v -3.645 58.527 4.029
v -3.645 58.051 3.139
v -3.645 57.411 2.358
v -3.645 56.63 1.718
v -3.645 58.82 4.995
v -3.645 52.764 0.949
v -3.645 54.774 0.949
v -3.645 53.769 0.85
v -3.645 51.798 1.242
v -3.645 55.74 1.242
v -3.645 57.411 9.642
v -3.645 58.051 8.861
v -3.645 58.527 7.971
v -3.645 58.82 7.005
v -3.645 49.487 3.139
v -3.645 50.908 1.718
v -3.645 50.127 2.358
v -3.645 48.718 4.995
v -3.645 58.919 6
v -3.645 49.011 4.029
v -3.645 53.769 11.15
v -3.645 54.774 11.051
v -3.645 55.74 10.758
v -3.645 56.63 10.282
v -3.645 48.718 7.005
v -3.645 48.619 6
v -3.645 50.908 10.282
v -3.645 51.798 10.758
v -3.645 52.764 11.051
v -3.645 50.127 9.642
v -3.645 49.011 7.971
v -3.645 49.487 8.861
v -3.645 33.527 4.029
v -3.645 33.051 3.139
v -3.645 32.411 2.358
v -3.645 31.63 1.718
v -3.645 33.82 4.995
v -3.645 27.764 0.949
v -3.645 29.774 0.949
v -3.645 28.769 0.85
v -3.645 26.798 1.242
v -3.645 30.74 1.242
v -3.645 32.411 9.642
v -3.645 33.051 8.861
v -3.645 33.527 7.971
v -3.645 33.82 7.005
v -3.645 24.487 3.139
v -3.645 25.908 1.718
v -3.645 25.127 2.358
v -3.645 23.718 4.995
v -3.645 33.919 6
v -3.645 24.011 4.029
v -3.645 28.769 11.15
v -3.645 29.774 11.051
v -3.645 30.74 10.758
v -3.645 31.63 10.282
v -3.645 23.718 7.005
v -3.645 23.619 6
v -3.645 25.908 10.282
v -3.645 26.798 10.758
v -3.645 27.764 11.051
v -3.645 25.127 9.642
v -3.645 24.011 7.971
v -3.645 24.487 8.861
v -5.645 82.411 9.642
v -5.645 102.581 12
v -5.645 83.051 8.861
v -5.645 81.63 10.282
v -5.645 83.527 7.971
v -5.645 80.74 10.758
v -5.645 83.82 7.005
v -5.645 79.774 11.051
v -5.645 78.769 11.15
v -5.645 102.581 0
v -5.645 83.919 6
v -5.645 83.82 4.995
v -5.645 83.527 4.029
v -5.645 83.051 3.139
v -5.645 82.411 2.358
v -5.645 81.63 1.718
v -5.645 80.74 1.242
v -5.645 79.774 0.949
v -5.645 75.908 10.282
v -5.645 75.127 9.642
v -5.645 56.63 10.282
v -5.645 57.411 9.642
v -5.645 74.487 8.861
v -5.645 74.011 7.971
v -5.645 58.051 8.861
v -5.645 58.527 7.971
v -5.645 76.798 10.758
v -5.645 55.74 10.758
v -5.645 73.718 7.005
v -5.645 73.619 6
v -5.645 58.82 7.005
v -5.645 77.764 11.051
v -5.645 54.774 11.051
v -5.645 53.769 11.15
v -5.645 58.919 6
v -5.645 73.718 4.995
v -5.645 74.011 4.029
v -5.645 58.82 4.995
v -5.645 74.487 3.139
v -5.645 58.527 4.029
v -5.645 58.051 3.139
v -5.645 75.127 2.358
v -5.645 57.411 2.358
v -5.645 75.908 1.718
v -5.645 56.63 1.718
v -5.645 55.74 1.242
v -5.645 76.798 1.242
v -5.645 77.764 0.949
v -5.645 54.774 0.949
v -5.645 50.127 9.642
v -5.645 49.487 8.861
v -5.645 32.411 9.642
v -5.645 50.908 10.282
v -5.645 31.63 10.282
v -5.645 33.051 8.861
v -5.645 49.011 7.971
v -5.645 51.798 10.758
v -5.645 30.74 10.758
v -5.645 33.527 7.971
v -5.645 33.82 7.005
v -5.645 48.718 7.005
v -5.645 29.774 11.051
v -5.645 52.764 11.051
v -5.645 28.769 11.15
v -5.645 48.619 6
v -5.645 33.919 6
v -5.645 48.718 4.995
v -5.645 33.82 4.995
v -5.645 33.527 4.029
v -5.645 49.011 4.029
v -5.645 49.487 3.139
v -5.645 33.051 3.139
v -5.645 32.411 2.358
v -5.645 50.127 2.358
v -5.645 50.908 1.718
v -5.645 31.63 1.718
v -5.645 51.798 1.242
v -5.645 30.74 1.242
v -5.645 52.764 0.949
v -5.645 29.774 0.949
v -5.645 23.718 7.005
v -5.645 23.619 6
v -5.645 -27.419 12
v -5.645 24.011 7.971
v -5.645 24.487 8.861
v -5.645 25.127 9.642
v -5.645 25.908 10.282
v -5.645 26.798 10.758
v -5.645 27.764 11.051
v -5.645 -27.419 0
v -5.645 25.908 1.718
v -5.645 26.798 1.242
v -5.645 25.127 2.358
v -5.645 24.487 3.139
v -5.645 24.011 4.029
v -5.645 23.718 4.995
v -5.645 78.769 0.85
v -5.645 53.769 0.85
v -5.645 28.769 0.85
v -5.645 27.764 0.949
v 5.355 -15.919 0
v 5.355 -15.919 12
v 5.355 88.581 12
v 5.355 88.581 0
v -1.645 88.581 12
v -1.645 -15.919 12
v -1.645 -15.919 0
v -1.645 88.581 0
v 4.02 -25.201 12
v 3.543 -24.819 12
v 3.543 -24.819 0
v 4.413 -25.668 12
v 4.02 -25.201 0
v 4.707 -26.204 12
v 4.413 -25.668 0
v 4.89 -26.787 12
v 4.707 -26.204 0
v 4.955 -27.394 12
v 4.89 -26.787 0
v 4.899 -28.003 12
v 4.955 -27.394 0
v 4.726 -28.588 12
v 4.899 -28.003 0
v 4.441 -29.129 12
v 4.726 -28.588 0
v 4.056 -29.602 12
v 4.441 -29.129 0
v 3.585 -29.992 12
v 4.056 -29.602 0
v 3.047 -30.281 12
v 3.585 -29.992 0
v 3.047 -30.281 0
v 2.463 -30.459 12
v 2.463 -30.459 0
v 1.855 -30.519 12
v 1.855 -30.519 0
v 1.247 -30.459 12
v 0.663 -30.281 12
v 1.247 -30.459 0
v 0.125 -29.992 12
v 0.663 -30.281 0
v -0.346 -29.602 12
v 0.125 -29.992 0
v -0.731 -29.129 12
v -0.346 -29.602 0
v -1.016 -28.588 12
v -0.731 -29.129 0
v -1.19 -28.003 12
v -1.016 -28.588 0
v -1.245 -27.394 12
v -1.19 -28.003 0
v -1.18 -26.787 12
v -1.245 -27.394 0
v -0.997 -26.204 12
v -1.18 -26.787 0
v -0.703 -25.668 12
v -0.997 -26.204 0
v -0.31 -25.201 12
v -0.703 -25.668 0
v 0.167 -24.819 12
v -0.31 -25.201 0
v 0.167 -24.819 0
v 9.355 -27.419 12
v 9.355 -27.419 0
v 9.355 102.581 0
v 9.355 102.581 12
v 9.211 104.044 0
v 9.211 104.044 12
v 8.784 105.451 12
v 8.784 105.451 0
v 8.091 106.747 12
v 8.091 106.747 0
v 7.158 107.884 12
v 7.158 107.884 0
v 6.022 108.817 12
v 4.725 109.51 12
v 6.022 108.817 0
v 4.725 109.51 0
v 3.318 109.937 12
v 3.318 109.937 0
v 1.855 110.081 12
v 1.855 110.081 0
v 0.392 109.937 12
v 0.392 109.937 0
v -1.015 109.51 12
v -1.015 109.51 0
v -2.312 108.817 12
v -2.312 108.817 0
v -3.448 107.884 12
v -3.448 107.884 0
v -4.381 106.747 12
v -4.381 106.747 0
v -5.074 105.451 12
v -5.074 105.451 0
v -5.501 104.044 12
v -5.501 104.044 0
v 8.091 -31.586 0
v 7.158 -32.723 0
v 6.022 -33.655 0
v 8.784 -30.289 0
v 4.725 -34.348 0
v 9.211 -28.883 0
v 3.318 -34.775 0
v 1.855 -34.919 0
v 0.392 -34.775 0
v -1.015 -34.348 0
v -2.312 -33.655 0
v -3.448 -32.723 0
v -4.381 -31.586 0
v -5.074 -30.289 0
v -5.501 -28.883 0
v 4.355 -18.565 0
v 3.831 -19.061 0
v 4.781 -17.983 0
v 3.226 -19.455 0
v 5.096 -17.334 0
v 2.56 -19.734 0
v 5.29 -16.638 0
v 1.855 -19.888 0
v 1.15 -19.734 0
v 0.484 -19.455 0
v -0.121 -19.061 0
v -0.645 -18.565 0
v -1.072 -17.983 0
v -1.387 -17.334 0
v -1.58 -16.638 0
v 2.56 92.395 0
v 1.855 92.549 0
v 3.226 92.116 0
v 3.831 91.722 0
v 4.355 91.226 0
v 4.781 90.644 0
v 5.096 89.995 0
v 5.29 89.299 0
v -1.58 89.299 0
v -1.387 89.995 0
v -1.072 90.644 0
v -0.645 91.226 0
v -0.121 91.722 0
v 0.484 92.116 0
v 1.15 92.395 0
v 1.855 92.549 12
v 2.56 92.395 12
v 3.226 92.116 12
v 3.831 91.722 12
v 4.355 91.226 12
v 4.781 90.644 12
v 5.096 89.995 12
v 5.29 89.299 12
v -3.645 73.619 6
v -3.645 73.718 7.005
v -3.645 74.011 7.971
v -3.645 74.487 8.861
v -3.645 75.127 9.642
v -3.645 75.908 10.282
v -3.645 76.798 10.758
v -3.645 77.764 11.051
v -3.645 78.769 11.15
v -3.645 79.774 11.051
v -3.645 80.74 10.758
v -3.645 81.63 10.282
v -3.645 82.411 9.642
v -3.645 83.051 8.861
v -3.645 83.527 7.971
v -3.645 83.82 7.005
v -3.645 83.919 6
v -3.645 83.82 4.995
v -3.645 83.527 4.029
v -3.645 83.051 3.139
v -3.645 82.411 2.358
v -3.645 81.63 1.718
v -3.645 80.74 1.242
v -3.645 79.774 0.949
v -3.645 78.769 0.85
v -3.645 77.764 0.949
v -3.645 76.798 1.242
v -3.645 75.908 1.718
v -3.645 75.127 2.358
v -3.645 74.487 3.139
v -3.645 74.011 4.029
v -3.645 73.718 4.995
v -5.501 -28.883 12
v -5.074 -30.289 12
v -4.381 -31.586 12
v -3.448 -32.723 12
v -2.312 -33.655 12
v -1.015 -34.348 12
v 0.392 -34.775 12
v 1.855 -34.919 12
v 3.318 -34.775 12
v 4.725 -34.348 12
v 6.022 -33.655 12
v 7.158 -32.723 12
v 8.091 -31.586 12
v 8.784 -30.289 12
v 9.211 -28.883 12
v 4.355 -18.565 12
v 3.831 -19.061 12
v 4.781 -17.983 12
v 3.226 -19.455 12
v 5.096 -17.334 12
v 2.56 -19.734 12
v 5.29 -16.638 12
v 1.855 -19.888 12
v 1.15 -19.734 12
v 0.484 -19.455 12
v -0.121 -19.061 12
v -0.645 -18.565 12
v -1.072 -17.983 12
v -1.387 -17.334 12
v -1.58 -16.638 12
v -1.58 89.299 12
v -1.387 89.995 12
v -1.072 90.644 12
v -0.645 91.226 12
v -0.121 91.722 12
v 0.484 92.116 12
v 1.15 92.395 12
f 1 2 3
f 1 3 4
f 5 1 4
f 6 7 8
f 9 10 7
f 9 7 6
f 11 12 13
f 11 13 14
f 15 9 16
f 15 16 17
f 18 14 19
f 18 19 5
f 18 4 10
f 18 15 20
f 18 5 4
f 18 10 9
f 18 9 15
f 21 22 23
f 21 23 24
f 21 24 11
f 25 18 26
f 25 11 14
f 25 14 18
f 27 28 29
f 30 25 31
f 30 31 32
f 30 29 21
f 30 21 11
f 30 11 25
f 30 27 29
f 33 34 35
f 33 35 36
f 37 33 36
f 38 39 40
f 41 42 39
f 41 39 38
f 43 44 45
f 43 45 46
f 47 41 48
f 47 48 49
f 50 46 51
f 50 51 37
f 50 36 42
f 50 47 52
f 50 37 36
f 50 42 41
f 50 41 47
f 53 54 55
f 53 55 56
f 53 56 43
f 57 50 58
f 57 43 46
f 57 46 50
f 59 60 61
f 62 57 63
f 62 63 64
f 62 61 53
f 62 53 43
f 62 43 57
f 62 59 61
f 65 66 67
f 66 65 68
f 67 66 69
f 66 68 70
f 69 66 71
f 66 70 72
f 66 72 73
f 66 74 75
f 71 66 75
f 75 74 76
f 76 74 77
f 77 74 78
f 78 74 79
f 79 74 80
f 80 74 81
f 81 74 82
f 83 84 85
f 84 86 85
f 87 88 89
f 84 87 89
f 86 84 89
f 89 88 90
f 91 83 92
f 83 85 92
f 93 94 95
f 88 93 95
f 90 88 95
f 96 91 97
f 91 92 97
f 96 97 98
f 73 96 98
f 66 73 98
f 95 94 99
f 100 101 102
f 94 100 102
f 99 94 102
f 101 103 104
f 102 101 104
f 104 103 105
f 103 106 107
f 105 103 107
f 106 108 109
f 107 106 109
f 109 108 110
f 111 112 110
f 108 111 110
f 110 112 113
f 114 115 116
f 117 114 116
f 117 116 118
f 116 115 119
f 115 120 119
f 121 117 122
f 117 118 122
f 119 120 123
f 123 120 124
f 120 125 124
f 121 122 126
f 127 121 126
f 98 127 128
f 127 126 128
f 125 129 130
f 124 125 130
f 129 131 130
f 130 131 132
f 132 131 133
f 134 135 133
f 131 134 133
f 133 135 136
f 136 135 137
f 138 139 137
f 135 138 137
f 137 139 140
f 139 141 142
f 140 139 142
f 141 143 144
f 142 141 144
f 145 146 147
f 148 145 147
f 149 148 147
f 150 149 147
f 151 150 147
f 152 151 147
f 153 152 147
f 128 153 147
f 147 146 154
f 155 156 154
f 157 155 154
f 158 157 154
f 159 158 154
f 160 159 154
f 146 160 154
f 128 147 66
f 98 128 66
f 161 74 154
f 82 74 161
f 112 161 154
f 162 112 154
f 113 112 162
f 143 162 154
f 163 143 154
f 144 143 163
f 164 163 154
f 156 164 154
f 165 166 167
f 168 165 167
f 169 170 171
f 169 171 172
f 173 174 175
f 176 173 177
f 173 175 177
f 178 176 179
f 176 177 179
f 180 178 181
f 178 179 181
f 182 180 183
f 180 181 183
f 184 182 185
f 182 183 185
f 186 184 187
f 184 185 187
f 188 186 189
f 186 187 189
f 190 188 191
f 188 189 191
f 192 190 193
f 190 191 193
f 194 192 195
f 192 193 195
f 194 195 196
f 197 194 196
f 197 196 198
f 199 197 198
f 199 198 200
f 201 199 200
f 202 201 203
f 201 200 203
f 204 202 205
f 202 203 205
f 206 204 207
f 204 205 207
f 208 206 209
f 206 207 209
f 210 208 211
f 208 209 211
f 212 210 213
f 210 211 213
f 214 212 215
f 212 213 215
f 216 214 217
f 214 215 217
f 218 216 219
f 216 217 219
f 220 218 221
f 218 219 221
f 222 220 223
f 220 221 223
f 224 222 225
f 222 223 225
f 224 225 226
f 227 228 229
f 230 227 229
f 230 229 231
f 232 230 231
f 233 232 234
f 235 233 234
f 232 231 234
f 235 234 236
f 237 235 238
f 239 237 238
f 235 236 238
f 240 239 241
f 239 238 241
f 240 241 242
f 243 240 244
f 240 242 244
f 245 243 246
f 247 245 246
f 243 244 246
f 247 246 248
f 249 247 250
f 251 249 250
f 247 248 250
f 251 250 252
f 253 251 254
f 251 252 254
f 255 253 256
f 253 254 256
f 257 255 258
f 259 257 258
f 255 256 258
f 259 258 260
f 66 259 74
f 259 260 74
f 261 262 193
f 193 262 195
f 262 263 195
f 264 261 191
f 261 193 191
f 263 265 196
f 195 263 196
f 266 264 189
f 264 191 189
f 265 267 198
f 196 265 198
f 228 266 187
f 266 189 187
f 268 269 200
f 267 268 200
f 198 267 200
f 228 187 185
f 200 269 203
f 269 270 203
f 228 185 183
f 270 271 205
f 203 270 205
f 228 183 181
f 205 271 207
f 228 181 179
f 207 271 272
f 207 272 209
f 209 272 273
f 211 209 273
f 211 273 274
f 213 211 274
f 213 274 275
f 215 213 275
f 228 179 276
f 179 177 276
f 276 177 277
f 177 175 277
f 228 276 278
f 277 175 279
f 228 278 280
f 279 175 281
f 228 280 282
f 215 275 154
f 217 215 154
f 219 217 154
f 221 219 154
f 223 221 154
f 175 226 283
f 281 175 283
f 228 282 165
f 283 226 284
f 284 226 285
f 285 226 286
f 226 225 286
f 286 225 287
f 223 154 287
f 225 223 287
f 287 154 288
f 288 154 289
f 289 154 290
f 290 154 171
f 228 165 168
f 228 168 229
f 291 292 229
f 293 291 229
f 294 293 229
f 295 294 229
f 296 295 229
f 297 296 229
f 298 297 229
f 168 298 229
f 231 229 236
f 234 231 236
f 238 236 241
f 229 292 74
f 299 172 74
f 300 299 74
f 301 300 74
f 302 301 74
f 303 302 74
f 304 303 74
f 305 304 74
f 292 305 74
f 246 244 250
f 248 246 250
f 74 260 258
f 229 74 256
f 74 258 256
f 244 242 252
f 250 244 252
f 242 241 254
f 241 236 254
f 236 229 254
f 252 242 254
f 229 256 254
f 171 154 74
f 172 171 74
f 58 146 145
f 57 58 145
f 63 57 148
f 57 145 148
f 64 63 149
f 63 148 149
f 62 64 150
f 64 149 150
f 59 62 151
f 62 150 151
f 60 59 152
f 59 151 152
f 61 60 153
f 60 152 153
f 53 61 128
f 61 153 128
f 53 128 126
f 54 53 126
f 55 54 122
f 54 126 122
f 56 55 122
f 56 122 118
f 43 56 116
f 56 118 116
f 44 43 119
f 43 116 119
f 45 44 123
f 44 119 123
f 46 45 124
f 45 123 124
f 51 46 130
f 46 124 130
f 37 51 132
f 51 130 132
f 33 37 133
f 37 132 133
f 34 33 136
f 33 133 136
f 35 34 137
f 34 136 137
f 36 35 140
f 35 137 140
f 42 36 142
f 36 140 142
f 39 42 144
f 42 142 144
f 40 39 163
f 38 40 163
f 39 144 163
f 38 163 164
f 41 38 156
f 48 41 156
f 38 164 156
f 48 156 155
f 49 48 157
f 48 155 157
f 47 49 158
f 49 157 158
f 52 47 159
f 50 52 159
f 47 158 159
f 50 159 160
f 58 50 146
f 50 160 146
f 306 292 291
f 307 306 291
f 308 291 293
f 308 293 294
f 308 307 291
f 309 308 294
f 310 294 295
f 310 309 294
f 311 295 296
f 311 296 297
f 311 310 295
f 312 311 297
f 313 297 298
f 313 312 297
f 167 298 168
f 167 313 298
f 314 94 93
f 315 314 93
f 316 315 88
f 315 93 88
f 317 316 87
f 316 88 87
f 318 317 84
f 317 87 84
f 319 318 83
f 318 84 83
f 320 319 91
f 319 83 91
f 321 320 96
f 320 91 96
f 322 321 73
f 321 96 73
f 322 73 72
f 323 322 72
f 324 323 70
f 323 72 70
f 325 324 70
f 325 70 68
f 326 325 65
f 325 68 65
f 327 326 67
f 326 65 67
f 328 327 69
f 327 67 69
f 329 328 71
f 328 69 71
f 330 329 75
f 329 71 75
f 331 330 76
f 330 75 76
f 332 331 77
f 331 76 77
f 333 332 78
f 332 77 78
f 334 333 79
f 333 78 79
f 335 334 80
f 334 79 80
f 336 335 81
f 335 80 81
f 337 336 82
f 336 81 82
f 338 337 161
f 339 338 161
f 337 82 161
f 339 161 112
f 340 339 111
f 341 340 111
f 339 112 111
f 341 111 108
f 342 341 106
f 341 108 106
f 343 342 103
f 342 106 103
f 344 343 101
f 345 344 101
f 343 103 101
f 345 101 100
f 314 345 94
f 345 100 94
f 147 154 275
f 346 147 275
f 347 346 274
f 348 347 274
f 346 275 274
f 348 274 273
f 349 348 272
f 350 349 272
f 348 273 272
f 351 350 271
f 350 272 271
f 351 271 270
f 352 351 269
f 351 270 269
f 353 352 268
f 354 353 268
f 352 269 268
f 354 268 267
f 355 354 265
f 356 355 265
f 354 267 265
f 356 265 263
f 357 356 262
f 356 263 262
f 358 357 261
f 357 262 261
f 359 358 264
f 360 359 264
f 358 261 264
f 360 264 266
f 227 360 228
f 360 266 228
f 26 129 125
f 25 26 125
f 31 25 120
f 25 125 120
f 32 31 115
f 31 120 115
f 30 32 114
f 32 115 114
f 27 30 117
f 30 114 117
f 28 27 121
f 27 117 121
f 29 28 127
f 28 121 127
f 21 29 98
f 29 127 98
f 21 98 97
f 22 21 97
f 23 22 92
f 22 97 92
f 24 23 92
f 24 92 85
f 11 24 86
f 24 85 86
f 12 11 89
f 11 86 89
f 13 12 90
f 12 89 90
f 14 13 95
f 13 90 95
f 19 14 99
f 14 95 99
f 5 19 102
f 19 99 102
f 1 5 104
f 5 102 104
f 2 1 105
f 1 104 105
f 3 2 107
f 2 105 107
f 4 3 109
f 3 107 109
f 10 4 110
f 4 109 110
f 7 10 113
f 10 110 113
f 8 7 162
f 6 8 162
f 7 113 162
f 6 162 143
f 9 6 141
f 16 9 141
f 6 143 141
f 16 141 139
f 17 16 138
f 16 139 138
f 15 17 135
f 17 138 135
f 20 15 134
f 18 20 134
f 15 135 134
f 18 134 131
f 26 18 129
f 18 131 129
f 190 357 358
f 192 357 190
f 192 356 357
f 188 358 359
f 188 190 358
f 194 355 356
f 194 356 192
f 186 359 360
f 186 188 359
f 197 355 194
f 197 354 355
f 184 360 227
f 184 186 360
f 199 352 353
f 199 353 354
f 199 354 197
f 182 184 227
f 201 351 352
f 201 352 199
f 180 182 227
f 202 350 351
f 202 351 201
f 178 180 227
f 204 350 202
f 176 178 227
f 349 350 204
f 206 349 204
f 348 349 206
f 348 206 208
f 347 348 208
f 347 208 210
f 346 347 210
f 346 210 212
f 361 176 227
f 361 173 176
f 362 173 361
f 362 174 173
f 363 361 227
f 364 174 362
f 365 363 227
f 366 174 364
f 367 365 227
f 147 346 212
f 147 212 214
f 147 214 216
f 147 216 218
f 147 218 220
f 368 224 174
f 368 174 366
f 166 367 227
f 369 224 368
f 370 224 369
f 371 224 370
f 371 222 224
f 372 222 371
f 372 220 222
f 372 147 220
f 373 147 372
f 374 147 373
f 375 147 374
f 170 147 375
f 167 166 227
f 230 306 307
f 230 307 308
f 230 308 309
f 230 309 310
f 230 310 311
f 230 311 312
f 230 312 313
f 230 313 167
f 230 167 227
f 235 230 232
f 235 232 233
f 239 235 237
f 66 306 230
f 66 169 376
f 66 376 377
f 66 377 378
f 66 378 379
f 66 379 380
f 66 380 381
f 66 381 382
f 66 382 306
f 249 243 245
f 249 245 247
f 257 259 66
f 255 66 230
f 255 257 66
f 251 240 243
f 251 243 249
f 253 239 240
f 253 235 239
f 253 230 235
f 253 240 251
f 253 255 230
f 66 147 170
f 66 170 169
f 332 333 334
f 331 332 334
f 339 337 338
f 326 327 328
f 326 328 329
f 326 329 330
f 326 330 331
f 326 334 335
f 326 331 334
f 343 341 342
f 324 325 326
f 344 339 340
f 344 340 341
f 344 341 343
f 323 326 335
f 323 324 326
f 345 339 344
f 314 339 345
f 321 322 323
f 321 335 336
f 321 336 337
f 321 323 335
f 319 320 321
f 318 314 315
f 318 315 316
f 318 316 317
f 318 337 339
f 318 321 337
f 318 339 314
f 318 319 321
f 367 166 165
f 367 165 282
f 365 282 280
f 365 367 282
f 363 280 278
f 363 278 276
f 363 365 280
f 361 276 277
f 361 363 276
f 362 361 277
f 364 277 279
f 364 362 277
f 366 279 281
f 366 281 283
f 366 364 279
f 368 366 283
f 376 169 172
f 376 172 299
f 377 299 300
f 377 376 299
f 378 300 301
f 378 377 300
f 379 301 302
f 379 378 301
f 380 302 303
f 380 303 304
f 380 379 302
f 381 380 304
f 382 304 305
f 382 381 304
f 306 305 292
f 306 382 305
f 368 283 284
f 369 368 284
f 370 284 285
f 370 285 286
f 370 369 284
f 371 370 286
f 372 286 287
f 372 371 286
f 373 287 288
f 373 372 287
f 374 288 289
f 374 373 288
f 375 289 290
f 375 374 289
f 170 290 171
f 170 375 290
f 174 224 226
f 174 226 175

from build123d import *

# Parameters (mm, degrees)
BOSS_EXTRUDE1_DEPTH = 12
SKETCH2_R           = 3.1
BOSS_EXTRUDE2_DEPTH = 15
CUT_EXTRUDE1_START  = -50
CUT_EXTRUDE1_DEPTH  = 50
CUT_EXTRUDE2_START  = -15
CUT_EXTRUDE2_DEPTH  = 15
SKETCH5_W           = 7
SKETCH5_H           = 112.5
CUT_EXTRUDE3_DEPTH  = 12
SKETCH6_R           = 5.15
CUT_EXTRUDE4_DEPTH  = 2
FILLET1_R           = 4


with BuildPart() as part:
    # Sketch1 → Boss-Extrude1 (new body)
    with BuildSketch(Plane.XY):
        with BuildLine():
            Line((-5.64516129, 102.580645161), (-5.64516129, -27.419354839))
            ThreePointArc((-5.64516129, -27.419354839), (1.85483871, -34.919354839), (9.35483871, -27.419354839))
            Line((9.35483871, -27.419354839), (9.35483871, 102.580645161))
            ThreePointArc((9.35483871, 102.580645161), (1.85483871, 110.080645161), (-5.64516129, 102.580645161))
        make_face()
    extrude(amount=BOSS_EXTRUDE1_DEPTH)

    # Sketch2 → Boss-Extrude2 (add)
    with BuildSketch(Plane.XY.offset(12)):
        with Locations(Location((1.85483871, -27.419354839, 0), (0, 0, 180))):
            Circle(SKETCH2_R)
    extrude(amount=BOSS_EXTRUDE2_DEPTH)

    # Sketch3 → Cut-Extrude1 (cut)
    with BuildSketch(Plane.XY.offset(27).offset(CUT_EXTRUDE1_START)):
        with BuildLine():
            Line((0.166644408, -24.819354839), (3.543033011, -24.819354839))
            ThreePointArc((3.543033011, -24.819354839), (1.85483871, -30.519354839), (0.166644408, -24.819354839))
        make_face()
    extrude(amount=CUT_EXTRUDE1_DEPTH, mode=Mode.SUBTRACT)

    # Sketch4 → Cut-Extrude2 (cut)
    with BuildSketch(Plane.XY.offset(27).offset(CUT_EXTRUDE2_START)):
        with BuildLine():
            Line((0.166644408, -24.819354839), (3.543033011, -24.819354839))
            ThreePointArc((3.543033011, -24.819354839), (1.85483871, -24.319354839), (0.166644408, -24.819354839))
        make_face()
    extrude(amount=CUT_EXTRUDE2_DEPTH, mode=Mode.SUBTRACT)

    # Sketch5 → Cut-Extrude3 (cut)
    with BuildSketch(Plane.XY.offset(12)):
        with Locations((1.85483871, 36.330645161)):
            Rectangle(SKETCH5_W, SKETCH5_H)
    extrude(amount=-CUT_EXTRUDE3_DEPTH, mode=Mode.SUBTRACT)

    # Sketch6 → Cut-Extrude4 (cut)
    with BuildSketch(Plane.ZY.offset(5.64516129)):
        with Locations(Location((6, 78.768969581, 0), (0, 0, 270))):
            Circle(SKETCH6_R)
        with Locations(Location((6, 53.768969581, 0), (0, 0, 270))):
            Circle(SKETCH6_R)
        with Locations(Location((6, 28.768969581, 0), (0, 0, 270))):
            Circle(SKETCH6_R)
    extrude(amount=-CUT_EXTRUDE4_DEPTH, mode=Mode.SUBTRACT)

    # Fillet1
    # the kernel refuses this fillet: 4 mm, written as the material it adds along each edge
    with BuildSketch(Plane(origin=(-1.64516129, -19.919354839, 12), x_dir=(0, 1, 0), z_dir=(0, 0, -1)), Plane(origin=(5.35483871, -19.919354839, 12), x_dir=(-1, 0, 0), z_dir=(0, 0, -1)), Plane(origin=(5.35483871, 92.580645161, 12), x_dir=(0, -1, 0), z_dir=(0, 0, -1))) as fillet1_piece_1:
        with BuildLine():
            CenterArc((FILLET1_R, FILLET1_R), FILLET1_R, 180, 90)
            Line((0, FILLET1_R), (0, 0))
            Line((0, 0), (FILLET1_R, 0))
        make_face()
    extrude(amount=12)
    with BuildSketch(Plane(origin=(-1.64516129, 92.580645161, 12), x_dir=(0, -1, 0), z_dir=(0, 0, -1))) as fillet1_piece_2:
        with BuildLine():
            CenterArc((FILLET1_R, -FILLET1_R), FILLET1_R, 90, 90)
            Line((0, -FILLET1_R), (0, 0))
            Line((0, 0), (FILLET1_R, 0))
        make_face()
    extrude(amount=12)


solid = part.part
